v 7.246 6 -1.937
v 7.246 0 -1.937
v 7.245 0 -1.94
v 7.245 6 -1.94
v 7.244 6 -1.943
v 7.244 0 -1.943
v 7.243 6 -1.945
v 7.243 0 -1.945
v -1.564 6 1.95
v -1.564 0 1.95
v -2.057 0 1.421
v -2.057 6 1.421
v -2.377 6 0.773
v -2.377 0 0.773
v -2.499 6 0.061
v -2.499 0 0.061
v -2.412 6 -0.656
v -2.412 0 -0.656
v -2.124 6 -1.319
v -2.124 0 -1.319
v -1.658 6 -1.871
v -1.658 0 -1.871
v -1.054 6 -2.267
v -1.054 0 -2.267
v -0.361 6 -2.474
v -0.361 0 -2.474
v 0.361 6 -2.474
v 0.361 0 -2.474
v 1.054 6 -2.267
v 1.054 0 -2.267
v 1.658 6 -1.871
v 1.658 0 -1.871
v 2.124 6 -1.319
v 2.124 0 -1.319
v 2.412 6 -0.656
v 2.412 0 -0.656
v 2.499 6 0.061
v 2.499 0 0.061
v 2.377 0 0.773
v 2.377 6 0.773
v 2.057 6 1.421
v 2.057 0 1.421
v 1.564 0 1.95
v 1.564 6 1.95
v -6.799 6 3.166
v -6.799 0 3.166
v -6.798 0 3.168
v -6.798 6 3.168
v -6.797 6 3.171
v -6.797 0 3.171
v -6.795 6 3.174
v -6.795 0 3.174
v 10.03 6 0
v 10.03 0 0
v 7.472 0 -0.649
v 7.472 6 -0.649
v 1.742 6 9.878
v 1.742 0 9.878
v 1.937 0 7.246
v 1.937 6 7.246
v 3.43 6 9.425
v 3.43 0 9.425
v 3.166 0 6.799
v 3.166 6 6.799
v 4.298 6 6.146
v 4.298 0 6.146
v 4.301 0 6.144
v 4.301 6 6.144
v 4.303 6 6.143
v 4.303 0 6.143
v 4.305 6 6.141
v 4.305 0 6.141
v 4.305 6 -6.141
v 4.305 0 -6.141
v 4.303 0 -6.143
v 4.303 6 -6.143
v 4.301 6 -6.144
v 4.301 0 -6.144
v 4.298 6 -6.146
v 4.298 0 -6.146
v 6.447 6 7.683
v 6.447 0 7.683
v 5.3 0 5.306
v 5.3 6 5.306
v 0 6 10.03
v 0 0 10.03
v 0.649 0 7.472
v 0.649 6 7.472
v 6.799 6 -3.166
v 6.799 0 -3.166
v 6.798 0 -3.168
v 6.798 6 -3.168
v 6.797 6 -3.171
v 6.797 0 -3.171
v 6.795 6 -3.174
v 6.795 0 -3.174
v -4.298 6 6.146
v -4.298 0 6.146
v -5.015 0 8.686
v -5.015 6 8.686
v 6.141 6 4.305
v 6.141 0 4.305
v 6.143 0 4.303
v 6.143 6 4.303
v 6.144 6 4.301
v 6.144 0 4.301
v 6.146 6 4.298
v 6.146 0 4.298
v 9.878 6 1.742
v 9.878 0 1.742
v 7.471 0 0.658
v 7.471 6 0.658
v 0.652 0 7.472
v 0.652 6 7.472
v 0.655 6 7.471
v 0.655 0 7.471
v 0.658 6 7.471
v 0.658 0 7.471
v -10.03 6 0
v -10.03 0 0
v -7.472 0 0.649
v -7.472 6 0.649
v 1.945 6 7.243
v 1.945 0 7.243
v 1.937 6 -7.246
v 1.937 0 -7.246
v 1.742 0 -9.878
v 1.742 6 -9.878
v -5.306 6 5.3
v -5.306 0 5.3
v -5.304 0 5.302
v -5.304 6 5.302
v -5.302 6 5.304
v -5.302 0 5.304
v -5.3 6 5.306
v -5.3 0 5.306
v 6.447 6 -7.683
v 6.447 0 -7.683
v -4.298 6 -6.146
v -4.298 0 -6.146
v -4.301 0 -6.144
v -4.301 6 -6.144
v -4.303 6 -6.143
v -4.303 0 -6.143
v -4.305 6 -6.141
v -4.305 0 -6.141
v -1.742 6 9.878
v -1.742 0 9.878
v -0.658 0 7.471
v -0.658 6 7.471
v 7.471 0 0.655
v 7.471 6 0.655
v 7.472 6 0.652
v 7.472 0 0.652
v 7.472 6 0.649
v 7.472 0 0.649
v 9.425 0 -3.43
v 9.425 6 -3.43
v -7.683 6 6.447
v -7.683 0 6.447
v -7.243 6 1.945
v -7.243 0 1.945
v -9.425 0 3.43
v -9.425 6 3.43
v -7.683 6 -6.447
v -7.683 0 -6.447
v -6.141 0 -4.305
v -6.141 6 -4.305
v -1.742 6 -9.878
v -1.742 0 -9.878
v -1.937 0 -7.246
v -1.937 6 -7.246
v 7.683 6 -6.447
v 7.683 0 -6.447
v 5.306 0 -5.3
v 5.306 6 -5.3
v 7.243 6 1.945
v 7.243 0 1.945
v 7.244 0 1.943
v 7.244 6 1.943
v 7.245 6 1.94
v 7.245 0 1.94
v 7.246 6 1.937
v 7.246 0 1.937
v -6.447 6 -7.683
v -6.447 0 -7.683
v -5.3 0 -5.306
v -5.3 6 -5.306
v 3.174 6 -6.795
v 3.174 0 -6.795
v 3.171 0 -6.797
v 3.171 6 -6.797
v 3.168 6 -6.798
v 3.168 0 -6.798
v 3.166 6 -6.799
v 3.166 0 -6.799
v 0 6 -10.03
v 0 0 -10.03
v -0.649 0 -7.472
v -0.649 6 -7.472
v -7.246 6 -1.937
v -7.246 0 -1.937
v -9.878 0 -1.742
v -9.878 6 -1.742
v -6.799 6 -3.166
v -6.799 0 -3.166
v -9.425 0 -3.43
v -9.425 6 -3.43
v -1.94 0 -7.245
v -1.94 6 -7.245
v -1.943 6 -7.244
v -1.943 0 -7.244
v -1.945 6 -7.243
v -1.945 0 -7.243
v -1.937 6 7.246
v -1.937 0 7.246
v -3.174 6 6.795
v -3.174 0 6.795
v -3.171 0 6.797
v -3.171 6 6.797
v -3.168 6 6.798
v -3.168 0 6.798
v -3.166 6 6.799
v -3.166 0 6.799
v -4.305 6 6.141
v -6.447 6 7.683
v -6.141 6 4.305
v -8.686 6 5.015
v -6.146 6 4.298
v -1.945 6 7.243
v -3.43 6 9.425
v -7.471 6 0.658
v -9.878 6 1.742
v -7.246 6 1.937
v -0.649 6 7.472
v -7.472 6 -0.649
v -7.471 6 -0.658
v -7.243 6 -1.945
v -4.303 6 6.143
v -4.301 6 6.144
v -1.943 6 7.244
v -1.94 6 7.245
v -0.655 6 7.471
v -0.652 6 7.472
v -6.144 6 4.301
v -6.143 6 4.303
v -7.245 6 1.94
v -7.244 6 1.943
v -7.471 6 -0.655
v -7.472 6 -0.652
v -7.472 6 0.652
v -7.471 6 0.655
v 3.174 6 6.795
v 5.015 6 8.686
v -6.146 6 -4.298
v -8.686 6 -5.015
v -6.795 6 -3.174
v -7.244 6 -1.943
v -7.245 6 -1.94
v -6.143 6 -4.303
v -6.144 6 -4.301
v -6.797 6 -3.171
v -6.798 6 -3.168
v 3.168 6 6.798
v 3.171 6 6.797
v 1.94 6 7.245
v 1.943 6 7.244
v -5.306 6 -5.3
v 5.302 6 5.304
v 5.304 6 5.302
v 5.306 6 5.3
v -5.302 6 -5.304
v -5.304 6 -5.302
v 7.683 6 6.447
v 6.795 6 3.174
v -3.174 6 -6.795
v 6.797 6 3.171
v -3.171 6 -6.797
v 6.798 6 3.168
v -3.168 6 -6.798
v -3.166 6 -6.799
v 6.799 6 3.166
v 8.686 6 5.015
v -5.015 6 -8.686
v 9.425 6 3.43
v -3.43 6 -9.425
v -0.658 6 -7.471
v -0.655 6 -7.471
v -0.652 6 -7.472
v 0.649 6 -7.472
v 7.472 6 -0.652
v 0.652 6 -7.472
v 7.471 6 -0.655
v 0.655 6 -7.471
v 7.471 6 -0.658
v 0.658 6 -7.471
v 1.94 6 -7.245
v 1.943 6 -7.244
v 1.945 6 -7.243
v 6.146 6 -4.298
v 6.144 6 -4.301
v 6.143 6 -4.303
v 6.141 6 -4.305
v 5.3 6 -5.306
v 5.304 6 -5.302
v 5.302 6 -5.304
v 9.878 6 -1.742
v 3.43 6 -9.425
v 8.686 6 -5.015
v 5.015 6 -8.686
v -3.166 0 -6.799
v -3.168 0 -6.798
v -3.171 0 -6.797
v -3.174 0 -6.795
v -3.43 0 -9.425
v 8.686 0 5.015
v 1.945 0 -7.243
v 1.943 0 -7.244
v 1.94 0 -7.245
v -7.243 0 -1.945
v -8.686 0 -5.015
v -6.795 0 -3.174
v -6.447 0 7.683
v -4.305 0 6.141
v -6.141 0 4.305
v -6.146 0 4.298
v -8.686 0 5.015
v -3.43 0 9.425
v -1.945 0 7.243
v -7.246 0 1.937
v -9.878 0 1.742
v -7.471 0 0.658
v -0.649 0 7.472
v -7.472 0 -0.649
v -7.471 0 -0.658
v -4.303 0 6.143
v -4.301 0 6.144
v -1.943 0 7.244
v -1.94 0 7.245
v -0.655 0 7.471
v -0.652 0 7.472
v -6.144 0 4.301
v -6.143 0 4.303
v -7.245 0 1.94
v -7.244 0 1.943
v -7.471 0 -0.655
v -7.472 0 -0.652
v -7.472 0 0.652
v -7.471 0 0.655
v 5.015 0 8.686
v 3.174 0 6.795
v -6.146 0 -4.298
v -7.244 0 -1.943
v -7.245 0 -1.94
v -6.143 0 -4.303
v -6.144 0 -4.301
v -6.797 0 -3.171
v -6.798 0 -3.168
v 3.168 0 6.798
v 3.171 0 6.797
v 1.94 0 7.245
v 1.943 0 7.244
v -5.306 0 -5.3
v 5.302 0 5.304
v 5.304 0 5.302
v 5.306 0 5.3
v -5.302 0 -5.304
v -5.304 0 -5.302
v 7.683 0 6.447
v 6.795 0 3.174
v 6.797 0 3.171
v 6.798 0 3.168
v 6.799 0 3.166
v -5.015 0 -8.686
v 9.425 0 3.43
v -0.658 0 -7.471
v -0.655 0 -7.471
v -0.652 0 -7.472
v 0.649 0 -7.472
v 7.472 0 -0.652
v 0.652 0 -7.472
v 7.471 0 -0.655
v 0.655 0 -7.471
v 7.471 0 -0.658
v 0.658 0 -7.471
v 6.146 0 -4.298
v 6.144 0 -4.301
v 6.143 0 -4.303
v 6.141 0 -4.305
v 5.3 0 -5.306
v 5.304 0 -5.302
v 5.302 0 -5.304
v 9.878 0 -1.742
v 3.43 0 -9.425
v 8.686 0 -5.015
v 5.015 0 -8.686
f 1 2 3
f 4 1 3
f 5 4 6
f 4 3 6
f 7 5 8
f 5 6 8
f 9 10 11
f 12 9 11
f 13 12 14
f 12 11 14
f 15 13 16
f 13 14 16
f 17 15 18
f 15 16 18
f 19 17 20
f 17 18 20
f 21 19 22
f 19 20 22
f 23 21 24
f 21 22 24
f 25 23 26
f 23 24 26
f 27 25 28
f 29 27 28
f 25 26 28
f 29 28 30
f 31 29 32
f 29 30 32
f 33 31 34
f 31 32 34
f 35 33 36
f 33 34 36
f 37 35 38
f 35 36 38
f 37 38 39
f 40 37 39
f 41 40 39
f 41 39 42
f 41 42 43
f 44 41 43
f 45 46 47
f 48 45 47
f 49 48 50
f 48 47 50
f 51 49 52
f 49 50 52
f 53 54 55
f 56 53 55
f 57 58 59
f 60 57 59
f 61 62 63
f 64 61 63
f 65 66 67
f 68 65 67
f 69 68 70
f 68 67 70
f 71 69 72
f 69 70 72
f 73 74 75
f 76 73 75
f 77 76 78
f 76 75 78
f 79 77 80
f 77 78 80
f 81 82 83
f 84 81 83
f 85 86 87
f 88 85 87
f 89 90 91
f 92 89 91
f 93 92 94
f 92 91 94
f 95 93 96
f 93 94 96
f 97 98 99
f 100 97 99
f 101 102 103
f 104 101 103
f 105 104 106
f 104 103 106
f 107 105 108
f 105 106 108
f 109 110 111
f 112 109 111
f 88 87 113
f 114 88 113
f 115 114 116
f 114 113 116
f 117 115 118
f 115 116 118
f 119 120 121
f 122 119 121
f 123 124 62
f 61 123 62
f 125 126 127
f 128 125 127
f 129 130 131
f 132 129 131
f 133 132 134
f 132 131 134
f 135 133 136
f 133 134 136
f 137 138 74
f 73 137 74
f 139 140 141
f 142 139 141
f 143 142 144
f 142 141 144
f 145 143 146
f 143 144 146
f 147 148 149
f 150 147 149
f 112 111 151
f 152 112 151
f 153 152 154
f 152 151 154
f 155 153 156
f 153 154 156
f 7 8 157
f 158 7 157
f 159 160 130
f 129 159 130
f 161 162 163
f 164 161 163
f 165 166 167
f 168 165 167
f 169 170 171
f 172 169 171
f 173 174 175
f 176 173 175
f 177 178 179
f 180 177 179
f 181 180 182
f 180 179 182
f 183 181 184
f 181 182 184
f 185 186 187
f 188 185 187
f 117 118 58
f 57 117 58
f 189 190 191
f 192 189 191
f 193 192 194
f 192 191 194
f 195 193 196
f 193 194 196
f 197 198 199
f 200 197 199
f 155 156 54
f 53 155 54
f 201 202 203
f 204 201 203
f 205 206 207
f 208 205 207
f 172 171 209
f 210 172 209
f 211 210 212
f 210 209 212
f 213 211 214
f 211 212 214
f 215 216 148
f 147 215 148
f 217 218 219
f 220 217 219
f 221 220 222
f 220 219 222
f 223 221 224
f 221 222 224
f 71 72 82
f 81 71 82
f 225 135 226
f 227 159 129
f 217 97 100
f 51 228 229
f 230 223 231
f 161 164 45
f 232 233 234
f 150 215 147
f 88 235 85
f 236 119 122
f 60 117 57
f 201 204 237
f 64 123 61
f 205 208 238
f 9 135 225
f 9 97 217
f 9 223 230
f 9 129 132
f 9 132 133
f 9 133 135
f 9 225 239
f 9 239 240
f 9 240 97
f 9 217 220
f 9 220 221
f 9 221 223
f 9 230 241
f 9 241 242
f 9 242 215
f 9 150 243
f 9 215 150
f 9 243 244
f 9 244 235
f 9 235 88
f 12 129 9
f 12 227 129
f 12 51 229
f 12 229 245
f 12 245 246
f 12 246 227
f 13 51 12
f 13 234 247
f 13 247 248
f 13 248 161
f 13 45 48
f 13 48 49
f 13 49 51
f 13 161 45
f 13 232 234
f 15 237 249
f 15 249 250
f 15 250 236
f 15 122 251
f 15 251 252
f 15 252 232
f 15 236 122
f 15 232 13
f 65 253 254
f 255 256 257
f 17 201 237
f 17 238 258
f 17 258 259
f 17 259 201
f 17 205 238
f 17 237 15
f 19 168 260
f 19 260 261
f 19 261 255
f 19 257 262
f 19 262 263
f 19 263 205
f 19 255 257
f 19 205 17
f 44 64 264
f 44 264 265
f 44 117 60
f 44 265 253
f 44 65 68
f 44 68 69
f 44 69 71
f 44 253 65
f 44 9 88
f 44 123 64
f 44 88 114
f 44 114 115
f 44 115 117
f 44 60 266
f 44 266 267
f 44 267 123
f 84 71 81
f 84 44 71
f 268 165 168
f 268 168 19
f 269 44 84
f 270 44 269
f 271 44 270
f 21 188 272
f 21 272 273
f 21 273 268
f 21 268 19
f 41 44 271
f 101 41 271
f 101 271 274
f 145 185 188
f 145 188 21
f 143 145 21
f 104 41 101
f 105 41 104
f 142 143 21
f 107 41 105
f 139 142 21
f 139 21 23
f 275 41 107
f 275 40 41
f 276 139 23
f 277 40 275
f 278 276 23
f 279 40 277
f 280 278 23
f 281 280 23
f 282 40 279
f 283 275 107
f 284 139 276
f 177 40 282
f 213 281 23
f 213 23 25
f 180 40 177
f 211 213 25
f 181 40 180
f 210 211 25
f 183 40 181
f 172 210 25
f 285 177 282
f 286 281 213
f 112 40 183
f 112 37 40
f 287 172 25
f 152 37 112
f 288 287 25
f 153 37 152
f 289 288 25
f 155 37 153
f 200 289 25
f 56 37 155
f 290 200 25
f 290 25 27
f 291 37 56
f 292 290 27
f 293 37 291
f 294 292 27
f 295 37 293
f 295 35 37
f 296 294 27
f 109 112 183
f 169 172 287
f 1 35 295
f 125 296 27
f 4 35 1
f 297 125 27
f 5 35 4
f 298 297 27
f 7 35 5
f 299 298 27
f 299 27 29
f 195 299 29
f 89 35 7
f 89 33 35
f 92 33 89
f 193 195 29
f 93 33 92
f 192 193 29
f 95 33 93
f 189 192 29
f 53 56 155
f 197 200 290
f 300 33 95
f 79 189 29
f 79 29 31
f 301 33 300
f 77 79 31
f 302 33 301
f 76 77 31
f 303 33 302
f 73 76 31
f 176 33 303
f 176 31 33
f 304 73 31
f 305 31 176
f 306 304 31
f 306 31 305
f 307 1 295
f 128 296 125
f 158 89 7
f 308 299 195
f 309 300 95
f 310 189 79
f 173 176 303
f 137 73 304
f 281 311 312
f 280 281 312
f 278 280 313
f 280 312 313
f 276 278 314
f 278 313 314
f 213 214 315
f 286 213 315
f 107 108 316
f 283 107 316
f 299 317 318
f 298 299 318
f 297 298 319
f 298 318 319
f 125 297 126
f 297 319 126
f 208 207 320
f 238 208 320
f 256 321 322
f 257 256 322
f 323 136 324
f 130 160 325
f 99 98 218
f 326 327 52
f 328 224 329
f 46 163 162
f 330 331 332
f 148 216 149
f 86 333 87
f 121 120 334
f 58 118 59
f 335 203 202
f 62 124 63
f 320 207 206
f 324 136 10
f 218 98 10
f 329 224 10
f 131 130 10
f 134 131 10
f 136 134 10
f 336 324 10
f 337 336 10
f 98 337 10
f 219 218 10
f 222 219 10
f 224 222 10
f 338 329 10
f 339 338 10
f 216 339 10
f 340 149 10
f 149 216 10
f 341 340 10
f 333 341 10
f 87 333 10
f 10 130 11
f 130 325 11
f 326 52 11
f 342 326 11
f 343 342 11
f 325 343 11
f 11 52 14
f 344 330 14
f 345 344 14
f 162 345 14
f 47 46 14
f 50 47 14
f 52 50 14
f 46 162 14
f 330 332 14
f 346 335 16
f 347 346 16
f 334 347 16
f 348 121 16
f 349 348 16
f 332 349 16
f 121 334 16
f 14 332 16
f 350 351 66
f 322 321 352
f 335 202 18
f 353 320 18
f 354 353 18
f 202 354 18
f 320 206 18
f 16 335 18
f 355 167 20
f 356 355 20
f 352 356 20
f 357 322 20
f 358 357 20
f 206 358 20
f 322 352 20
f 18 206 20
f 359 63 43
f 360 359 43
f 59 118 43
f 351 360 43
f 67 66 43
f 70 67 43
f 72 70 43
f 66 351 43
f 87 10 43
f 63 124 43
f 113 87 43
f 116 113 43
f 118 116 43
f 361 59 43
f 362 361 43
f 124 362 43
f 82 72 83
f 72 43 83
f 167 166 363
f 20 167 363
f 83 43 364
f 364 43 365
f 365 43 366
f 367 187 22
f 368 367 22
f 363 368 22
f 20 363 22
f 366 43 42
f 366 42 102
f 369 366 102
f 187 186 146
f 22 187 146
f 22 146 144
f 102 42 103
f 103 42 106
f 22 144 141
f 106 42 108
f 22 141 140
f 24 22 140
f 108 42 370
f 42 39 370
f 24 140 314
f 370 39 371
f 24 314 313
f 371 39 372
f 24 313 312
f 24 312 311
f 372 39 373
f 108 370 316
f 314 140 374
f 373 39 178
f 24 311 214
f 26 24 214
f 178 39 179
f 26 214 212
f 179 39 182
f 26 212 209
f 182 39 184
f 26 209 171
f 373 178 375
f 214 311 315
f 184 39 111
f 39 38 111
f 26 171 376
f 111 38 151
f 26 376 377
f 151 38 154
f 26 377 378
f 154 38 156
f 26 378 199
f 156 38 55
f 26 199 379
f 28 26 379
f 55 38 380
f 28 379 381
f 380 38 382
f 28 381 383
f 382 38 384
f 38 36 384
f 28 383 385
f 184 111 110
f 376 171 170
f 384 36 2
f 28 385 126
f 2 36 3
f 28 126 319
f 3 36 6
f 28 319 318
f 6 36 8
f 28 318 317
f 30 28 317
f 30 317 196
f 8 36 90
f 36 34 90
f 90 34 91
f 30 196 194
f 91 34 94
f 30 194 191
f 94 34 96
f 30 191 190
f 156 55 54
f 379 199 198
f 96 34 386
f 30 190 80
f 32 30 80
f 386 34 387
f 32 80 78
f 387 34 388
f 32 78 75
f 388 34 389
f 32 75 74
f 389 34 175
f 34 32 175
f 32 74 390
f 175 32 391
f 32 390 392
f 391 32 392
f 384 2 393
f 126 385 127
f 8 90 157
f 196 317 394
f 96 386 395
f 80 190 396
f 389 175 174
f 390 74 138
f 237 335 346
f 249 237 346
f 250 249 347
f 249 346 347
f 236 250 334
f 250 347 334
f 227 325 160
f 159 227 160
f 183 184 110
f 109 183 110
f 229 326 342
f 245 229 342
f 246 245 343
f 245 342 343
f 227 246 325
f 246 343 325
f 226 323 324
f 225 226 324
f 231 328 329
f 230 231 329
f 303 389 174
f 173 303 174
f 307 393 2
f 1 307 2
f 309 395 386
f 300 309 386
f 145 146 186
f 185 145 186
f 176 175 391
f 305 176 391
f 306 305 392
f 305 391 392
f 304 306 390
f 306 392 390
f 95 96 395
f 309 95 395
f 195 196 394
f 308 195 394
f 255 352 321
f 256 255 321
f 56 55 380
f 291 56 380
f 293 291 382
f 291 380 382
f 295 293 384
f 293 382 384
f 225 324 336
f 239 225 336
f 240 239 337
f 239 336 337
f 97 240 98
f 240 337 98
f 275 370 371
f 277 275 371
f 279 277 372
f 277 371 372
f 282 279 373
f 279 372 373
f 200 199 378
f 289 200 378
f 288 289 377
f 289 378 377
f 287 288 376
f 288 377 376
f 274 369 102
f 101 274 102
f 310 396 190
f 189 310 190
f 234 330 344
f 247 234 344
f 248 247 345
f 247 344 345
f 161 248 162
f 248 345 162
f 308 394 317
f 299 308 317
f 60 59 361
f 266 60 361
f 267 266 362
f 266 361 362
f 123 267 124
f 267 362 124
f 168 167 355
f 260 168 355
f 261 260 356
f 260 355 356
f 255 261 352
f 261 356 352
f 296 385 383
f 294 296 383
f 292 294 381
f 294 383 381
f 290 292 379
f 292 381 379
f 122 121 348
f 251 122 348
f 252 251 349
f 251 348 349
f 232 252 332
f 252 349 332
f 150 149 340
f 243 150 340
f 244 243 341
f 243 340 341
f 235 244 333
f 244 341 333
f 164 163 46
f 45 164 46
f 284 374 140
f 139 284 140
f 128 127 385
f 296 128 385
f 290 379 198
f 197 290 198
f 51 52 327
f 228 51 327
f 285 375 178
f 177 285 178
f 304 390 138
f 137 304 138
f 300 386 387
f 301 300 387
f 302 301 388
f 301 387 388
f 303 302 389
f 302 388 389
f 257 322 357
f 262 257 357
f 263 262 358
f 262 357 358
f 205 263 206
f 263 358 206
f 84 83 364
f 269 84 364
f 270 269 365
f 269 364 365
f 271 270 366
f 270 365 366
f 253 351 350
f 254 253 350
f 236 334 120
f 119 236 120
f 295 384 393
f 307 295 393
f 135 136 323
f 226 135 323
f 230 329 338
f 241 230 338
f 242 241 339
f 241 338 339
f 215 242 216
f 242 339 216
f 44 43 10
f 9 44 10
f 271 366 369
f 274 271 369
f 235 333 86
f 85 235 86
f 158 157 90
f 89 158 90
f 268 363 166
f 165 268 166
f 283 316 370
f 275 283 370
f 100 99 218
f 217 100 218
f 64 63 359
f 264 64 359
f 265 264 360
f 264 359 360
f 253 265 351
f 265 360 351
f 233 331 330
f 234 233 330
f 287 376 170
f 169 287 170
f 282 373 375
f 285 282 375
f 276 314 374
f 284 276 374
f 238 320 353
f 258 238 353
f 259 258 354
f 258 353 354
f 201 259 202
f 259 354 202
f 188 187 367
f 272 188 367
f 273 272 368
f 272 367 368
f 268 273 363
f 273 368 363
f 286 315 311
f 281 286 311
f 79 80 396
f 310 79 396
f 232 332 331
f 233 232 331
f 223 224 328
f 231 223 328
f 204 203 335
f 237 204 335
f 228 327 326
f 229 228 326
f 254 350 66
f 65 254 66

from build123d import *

# Parameters (mm, degrees)
EXTRUDE_2_DEPTH = 6


with BuildPart() as part:
    # Эскиз1 → Бобышка-Вытянуть2 (new body)
    with BuildSketch(Plane(origin=(0, 0, 0), x_dir=(1, 0, 0), z_dir=(0, 1, 0))):
        with BuildLine():
            Line((0, 10.03), (-0.649389435, 7.471833333))
            ThreePointArc((-0.649389435, 7.471833333), (-0.653668071, 7.471460236), (-0.657946491, 7.471084688))
            Line((-0.657946491, 7.471084688), (-1.741691222, 9.877621763))
            Line((-1.741691222, 9.877621763), (-1.936993993, 7.245554104))
            ThreePointArc((-1.936993993, 7.245554104), (-1.941142838, 7.244443697), (-1.945291047, 7.243330915))
            Line((-1.945291047, 7.243330915), (-3.430462038, 9.425116986))
            Line((-3.430462038, 9.425116986), (-3.165743968, 6.799122379))
            ThreePointArc((-3.165743968, 6.799122379), (-3.169636963, 6.797308403), (-3.173528919, 6.795492197))
            Line((-3.173528919, 6.795492197), (-5.015, 8.6862348))
            Line((-5.015, 8.6862348), (-4.298304415, 6.146102762))
            ThreePointArc((-4.298304415, 6.146102762), (-4.301823273, 6.143640332), (-4.30534072, 6.141175888))
            Line((-4.30534072, 6.141175888), (-6.447159725, 7.683425764))
            Line((-6.447159725, 7.683425764), (-5.300263057, 5.306336922))
            ThreePointArc((-5.300263057, 5.306336922), (-5.303300859, 5.303300859), (-5.306336922, 5.300263057))
            Line((-5.306336922, 5.300263057), (-7.683425764, 6.447159725))
            Line((-7.683425764, 6.447159725), (-6.141175888, 4.30534072))
            ThreePointArc((-6.141175888, 4.30534072), (-6.143640332, 4.301823273), (-6.146102762, 4.298304415))
            Line((-6.146102762, 4.298304415), (-8.6862348, 5.015))
            Line((-8.6862348, 5.015), (-6.795492197, 3.173528919))
            ThreePointArc((-6.795492197, 3.173528919), (-6.797308403, 3.169636963), (-6.799122379, 3.165743968))
            Line((-6.799122379, 3.165743968), (-9.425116986, 3.430462038))
            Line((-9.425116986, 3.430462038), (-7.243330915, 1.945291047))
            ThreePointArc((-7.243330915, 1.945291047), (-7.244443697, 1.941142838), (-7.245554104, 1.936993993))
            Line((-7.245554104, 1.936993993), (-9.877621763, 1.741691222))
            Line((-9.877621763, 1.741691222), (-7.471084688, 0.657946491))
            ThreePointArc((-7.471084688, 0.657946491), (-7.471460236, 0.653668071), (-7.471833333, 0.649389435))
            Line((-7.471833333, 0.649389435), (-10.03, 0))
            Line((-10.03, 0), (-7.471833333, -0.649389435))
            ThreePointArc((-7.471833333, -0.649389435), (-7.471460236, -0.653668071), (-7.471084688, -0.657946491))
            Line((-7.471084688, -0.657946491), (-9.877621763, -1.741691222))
            Line((-9.877621763, -1.741691222), (-7.245554104, -1.936993993))
            ThreePointArc((-7.245554104, -1.936993993), (-7.244443697, -1.941142838), (-7.243330915, -1.945291047))
            Line((-7.243330915, -1.945291047), (-9.425116986, -3.430462038))
            Line((-9.425116986, -3.430462038), (-6.799122379, -3.165743968))
            ThreePointArc((-6.799122379, -3.165743968), (-6.797308403, -3.169636963), (-6.795492197, -3.173528919))
            Line((-6.795492197, -3.173528919), (-8.6862348, -5.015))
            Line((-8.6862348, -5.015), (-6.146102762, -4.298304415))
            ThreePointArc((-6.146102762, -4.298304415), (-6.143640332, -4.301823273), (-6.141175888, -4.30534072))
            Line((-6.141175888, -4.30534072), (-7.683425764, -6.447159725))
            Line((-7.683425764, -6.447159725), (-5.306336922, -5.300263057))
            ThreePointArc((-5.306336922, -5.300263057), (-5.303300859, -5.303300859), (-5.300263057, -5.306336922))
            Line((-5.300263057, -5.306336922), (-6.447159725, -7.683425764))
            Line((-6.447159725, -7.683425764), (-4.30534072, -6.141175888))
            ThreePointArc((-4.30534072, -6.141175888), (-4.301823273, -6.143640332), (-4.298304415, -6.146102762))
            Line((-4.298304415, -6.146102762), (-5.015, -8.6862348))
            Line((-5.015, -8.6862348), (-3.173528919, -6.795492197))
            ThreePointArc((-3.173528919, -6.795492197), (-3.169636963, -6.797308403), (-3.165743968, -6.799122379))
            Line((-3.165743968, -6.799122379), (-3.430462038, -9.425116986))
            Line((-3.430462038, -9.425116986), (-1.945291047, -7.243330915))
            ThreePointArc((-1.945291047, -7.243330915), (-1.941142838, -7.244443697), (-1.936993993, -7.245554104))
            Line((-1.936993993, -7.245554104), (-1.741691222, -9.877621763))
            Line((-1.741691222, -9.877621763), (-0.657946491, -7.471084688))
            ThreePointArc((-0.657946491, -7.471084688), (-0.653668071, -7.471460236), (-0.649389435, -7.471833333))
            Line((-0.649389435, -7.471833333), (0, -10.03))
            Line((0, -10.03), (0.649389435, -7.471833333))
            ThreePointArc((0.649389435, -7.471833333), (0.653668071, -7.471460236), (0.657946491, -7.471084688))
            Line((0.657946491, -7.471084688), (1.741691222, -9.877621763))
            Line((1.741691222, -9.877621763), (1.936993993, -7.245554104))
            ThreePointArc((1.936993993, -7.245554104), (1.941142838, -7.244443697), (1.945291047, -7.243330915))
            Line((1.945291047, -7.243330915), (3.430462038, -9.425116986))
            Line((3.430462038, -9.425116986), (3.165743968, -6.799122379))
            ThreePointArc((3.165743968, -6.799122379), (3.169636963, -6.797308403), (3.173528919, -6.795492197))
            Line((3.173528919, -6.795492197), (5.015, -8.6862348))
            Line((5.015, -8.6862348), (4.298304415, -6.146102762))
            ThreePointArc((4.298304415, -6.146102762), (4.301823273, -6.143640332), (4.30534072, -6.141175888))
            Line((4.30534072, -6.141175888), (6.447159725, -7.683425764))
            Line((6.447159725, -7.683425764), (5.300263057, -5.306336922))
            ThreePointArc((5.300263057, -5.306336922), (5.303300859, -5.303300859), (5.306336922, -5.300263057))
            Line((5.306336922, -5.300263057), (7.683425764, -6.447159725))
            Line((7.683425764, -6.447159725), (6.141175888, -4.30534072))
            ThreePointArc((6.141175888, -4.30534072), (6.143640332, -4.301823273), (6.146102762, -4.298304415))
            Line((6.146102762, -4.298304415), (8.6862348, -5.015))
            Line((8.6862348, -5.015), (6.795492197, -3.173528919))
            ThreePointArc((6.795492197, -3.173528919), (6.797308403, -3.169636963), (6.799122379, -3.165743968))
            Line((6.799122379, -3.165743968), (9.425116986, -3.430462038))
            Line((9.425116986, -3.430462038), (7.243330915, -1.945291047))
            ThreePointArc((7.243330915, -1.945291047), (7.244443697, -1.941142838), (7.245554104, -1.936993993))
            Line((7.245554104, -1.936993993), (9.877621763, -1.741691222))
            Line((9.877621763, -1.741691222), (7.471084688, -0.657946491))
            ThreePointArc((7.471084688, -0.657946491), (7.471460236, -0.653668071), (7.471833333, -0.649389435))
            Line((7.471833333, -0.649389435), (10.03, 0))
            Line((10.03, 0), (7.471833333, 0.649389435))
            ThreePointArc((7.471833333, 0.649389435), (7.471460236, 0.653668071), (7.471084688, 0.657946491))
            Line((7.471084688, 0.657946491), (9.877621763, 1.741691222))
            Line((9.877621763, 1.741691222), (7.245554104, 1.936993993))
            ThreePointArc((7.245554104, 1.936993993), (7.244443697, 1.941142838), (7.243330915, 1.945291047))
            Line((7.243330915, 1.945291047), (9.425116986, 3.430462038))
            Line((9.425116986, 3.430462038), (6.799122379, 3.165743968))
            ThreePointArc((6.799122379, 3.165743968), (6.797308403, 3.169636963), (6.795492197, 3.173528919))
            Line((6.795492197, 3.173528919), (8.6862348, 5.015))
            Line((8.6862348, 5.015), (6.146102762, 4.298304415))
            ThreePointArc((6.146102762, 4.298304415), (6.143640332, 4.301823273), (6.141175888, 4.30534072))
            Line((6.141175888, 4.30534072), (7.683425764, 6.447159725))
            Line((7.683425764, 6.447159725), (5.306336922, 5.300263057))
            ThreePointArc((5.306336922, 5.300263057), (5.303300859, 5.303300859), (5.300263057, 5.306336922))
            Line((5.300263057, 5.306336922), (6.447159725, 7.683425764))
            Line((6.447159725, 7.683425764), (4.30534072, 6.141175888))
            ThreePointArc((4.30534072, 6.141175888), (4.301823273, 6.143640332), (4.298304415, 6.146102762))
            Line((4.298304415, 6.146102762), (5.015, 8.6862348))
            Line((5.015, 8.6862348), (3.173528919, 6.795492197))
            ThreePointArc((3.173528919, 6.795492197), (3.169636963, 6.797308403), (3.165743968, 6.799122379))
            Line((3.165743968, 6.799122379), (3.430462038, 9.425116986))
            Line((3.430462038, 9.425116986), (1.945291047, 7.243330915))
            ThreePointArc((1.945291047, 7.243330915), (1.941142838, 7.244443697), (1.936993993, 7.245554104))
            Line((1.936993993, 7.245554104), (1.741691222, 9.877621763))
            Line((1.741691222, 9.877621763), (0.657946491, 7.471084688))
            ThreePointArc((0.657946491, 7.471084688), (0.653668071, 7.471460236), (0.649389435, 7.471833333))
            Line((0.649389435, 7.471833333), (0, 10.03))
        make_face()
        with BuildLine():
            ThreePointArc((-1.564448785, -1.95), (0, 2.5), (1.564448785, -1.95))
            Line((1.564448785, -1.95), (-1.564448785, -1.95))
        make_face(mode=Mode.SUBTRACT)
    extrude(amount=EXTRUDE_2_DEPTH)


solid = part.part
